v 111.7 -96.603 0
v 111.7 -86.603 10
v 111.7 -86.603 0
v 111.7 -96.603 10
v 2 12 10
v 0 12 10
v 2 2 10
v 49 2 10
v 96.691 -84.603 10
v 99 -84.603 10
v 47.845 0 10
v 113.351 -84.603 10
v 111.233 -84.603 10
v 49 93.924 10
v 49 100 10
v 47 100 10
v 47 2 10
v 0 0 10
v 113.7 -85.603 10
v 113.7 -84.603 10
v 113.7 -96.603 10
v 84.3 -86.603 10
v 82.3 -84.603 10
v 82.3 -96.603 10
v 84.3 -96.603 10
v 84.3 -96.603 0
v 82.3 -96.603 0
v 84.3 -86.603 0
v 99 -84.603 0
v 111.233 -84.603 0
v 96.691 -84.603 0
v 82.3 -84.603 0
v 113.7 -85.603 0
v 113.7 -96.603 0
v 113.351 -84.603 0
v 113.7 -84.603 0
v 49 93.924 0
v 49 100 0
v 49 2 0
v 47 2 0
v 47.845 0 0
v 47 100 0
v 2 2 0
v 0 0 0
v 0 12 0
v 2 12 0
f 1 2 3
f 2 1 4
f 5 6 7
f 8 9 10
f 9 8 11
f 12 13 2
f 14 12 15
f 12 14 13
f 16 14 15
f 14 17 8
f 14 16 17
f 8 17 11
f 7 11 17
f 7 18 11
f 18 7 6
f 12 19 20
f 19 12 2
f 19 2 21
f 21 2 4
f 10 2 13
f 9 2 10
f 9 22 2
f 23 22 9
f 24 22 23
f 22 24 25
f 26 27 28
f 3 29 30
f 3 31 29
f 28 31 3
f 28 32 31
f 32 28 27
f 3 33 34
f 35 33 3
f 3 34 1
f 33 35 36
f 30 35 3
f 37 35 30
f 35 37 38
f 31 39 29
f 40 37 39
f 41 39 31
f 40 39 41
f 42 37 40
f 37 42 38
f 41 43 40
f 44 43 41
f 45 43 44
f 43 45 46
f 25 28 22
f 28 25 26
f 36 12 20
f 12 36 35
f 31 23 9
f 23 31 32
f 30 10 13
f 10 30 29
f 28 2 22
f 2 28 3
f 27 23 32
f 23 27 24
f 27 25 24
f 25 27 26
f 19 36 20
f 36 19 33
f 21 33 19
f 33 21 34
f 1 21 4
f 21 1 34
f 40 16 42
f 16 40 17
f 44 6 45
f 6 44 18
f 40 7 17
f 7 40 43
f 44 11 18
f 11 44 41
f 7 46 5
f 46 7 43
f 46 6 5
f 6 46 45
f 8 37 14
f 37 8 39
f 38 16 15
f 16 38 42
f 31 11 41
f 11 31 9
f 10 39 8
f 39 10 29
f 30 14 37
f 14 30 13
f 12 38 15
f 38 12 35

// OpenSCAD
thickness = 2;
width = 10;

// Thickness of TV from the front to the back
TV_thickness = 45;

// Length of the "finger" holding on to the TV and the camera
finger_length = 10;

// Thickness of the camera, this is the size of the V1 camera
cam_thickness = 27.4;

// Lean back angle for the arm standing up the camera, increase this to push the camera back
arm_angle = 30;

// Length of the arm standing up the camera, increase this to have the camera stand higher from the TV 
arm_length = 100;

// Length of the foot down the back of the TV
foot_length = 100;

// Down tilt angle for the camera, change this to fit your play space
cam_angle = 0;



/* [Hidden] */
support_length = sqrt(
pow(arm_length*sin(arm_angle)+cam_thickness/2*cos(cam_angle)+thickness/2,2)+
pow(arm_length*cos(arm_angle)+cam_thickness/2*sin(cam_angle)+foot_length-thickness/2,2));
support_angle = atan2(
arm_length*sin(arm_angle)+cam_thickness/2*cos(cam_angle)+thickness/2,
arm_length*cos(arm_angle)+cam_thickness/2*sin(cam_angle)+foot_length-thickness/2
);



cube([TV_thickness+thickness,thickness,width]);
cube([thickness,finger_length+thickness,width]);

translate([TV_thickness+thickness,0,0])
cube([thickness,foot_length,width]);

translate([TV_thickness+thickness*2,thickness,0])
rotate([0,0,180+arm_angle])
cube([thickness,arm_length,width]);


translate([sin(arm_angle)*arm_length+TV_thickness+thickness*3/2,-cos(arm_angle)*arm_length,0])
rotate([0,0,-cam_angle])
translate([-cam_thickness/2,0,0]){
    cube([cam_thickness,thickness,width]);
    translate([-thickness,-finger_length,0])
    cube([thickness,thickness+finger_length,width]);
    translate([cam_thickness,-finger_length,0])
    cube([thickness,thickness+finger_length,width]);
}

translate([TV_thickness+thickness*2,foot_length,0])
rotate([0,0,support_angle+180])
cube([thickness,support_length,width]);
